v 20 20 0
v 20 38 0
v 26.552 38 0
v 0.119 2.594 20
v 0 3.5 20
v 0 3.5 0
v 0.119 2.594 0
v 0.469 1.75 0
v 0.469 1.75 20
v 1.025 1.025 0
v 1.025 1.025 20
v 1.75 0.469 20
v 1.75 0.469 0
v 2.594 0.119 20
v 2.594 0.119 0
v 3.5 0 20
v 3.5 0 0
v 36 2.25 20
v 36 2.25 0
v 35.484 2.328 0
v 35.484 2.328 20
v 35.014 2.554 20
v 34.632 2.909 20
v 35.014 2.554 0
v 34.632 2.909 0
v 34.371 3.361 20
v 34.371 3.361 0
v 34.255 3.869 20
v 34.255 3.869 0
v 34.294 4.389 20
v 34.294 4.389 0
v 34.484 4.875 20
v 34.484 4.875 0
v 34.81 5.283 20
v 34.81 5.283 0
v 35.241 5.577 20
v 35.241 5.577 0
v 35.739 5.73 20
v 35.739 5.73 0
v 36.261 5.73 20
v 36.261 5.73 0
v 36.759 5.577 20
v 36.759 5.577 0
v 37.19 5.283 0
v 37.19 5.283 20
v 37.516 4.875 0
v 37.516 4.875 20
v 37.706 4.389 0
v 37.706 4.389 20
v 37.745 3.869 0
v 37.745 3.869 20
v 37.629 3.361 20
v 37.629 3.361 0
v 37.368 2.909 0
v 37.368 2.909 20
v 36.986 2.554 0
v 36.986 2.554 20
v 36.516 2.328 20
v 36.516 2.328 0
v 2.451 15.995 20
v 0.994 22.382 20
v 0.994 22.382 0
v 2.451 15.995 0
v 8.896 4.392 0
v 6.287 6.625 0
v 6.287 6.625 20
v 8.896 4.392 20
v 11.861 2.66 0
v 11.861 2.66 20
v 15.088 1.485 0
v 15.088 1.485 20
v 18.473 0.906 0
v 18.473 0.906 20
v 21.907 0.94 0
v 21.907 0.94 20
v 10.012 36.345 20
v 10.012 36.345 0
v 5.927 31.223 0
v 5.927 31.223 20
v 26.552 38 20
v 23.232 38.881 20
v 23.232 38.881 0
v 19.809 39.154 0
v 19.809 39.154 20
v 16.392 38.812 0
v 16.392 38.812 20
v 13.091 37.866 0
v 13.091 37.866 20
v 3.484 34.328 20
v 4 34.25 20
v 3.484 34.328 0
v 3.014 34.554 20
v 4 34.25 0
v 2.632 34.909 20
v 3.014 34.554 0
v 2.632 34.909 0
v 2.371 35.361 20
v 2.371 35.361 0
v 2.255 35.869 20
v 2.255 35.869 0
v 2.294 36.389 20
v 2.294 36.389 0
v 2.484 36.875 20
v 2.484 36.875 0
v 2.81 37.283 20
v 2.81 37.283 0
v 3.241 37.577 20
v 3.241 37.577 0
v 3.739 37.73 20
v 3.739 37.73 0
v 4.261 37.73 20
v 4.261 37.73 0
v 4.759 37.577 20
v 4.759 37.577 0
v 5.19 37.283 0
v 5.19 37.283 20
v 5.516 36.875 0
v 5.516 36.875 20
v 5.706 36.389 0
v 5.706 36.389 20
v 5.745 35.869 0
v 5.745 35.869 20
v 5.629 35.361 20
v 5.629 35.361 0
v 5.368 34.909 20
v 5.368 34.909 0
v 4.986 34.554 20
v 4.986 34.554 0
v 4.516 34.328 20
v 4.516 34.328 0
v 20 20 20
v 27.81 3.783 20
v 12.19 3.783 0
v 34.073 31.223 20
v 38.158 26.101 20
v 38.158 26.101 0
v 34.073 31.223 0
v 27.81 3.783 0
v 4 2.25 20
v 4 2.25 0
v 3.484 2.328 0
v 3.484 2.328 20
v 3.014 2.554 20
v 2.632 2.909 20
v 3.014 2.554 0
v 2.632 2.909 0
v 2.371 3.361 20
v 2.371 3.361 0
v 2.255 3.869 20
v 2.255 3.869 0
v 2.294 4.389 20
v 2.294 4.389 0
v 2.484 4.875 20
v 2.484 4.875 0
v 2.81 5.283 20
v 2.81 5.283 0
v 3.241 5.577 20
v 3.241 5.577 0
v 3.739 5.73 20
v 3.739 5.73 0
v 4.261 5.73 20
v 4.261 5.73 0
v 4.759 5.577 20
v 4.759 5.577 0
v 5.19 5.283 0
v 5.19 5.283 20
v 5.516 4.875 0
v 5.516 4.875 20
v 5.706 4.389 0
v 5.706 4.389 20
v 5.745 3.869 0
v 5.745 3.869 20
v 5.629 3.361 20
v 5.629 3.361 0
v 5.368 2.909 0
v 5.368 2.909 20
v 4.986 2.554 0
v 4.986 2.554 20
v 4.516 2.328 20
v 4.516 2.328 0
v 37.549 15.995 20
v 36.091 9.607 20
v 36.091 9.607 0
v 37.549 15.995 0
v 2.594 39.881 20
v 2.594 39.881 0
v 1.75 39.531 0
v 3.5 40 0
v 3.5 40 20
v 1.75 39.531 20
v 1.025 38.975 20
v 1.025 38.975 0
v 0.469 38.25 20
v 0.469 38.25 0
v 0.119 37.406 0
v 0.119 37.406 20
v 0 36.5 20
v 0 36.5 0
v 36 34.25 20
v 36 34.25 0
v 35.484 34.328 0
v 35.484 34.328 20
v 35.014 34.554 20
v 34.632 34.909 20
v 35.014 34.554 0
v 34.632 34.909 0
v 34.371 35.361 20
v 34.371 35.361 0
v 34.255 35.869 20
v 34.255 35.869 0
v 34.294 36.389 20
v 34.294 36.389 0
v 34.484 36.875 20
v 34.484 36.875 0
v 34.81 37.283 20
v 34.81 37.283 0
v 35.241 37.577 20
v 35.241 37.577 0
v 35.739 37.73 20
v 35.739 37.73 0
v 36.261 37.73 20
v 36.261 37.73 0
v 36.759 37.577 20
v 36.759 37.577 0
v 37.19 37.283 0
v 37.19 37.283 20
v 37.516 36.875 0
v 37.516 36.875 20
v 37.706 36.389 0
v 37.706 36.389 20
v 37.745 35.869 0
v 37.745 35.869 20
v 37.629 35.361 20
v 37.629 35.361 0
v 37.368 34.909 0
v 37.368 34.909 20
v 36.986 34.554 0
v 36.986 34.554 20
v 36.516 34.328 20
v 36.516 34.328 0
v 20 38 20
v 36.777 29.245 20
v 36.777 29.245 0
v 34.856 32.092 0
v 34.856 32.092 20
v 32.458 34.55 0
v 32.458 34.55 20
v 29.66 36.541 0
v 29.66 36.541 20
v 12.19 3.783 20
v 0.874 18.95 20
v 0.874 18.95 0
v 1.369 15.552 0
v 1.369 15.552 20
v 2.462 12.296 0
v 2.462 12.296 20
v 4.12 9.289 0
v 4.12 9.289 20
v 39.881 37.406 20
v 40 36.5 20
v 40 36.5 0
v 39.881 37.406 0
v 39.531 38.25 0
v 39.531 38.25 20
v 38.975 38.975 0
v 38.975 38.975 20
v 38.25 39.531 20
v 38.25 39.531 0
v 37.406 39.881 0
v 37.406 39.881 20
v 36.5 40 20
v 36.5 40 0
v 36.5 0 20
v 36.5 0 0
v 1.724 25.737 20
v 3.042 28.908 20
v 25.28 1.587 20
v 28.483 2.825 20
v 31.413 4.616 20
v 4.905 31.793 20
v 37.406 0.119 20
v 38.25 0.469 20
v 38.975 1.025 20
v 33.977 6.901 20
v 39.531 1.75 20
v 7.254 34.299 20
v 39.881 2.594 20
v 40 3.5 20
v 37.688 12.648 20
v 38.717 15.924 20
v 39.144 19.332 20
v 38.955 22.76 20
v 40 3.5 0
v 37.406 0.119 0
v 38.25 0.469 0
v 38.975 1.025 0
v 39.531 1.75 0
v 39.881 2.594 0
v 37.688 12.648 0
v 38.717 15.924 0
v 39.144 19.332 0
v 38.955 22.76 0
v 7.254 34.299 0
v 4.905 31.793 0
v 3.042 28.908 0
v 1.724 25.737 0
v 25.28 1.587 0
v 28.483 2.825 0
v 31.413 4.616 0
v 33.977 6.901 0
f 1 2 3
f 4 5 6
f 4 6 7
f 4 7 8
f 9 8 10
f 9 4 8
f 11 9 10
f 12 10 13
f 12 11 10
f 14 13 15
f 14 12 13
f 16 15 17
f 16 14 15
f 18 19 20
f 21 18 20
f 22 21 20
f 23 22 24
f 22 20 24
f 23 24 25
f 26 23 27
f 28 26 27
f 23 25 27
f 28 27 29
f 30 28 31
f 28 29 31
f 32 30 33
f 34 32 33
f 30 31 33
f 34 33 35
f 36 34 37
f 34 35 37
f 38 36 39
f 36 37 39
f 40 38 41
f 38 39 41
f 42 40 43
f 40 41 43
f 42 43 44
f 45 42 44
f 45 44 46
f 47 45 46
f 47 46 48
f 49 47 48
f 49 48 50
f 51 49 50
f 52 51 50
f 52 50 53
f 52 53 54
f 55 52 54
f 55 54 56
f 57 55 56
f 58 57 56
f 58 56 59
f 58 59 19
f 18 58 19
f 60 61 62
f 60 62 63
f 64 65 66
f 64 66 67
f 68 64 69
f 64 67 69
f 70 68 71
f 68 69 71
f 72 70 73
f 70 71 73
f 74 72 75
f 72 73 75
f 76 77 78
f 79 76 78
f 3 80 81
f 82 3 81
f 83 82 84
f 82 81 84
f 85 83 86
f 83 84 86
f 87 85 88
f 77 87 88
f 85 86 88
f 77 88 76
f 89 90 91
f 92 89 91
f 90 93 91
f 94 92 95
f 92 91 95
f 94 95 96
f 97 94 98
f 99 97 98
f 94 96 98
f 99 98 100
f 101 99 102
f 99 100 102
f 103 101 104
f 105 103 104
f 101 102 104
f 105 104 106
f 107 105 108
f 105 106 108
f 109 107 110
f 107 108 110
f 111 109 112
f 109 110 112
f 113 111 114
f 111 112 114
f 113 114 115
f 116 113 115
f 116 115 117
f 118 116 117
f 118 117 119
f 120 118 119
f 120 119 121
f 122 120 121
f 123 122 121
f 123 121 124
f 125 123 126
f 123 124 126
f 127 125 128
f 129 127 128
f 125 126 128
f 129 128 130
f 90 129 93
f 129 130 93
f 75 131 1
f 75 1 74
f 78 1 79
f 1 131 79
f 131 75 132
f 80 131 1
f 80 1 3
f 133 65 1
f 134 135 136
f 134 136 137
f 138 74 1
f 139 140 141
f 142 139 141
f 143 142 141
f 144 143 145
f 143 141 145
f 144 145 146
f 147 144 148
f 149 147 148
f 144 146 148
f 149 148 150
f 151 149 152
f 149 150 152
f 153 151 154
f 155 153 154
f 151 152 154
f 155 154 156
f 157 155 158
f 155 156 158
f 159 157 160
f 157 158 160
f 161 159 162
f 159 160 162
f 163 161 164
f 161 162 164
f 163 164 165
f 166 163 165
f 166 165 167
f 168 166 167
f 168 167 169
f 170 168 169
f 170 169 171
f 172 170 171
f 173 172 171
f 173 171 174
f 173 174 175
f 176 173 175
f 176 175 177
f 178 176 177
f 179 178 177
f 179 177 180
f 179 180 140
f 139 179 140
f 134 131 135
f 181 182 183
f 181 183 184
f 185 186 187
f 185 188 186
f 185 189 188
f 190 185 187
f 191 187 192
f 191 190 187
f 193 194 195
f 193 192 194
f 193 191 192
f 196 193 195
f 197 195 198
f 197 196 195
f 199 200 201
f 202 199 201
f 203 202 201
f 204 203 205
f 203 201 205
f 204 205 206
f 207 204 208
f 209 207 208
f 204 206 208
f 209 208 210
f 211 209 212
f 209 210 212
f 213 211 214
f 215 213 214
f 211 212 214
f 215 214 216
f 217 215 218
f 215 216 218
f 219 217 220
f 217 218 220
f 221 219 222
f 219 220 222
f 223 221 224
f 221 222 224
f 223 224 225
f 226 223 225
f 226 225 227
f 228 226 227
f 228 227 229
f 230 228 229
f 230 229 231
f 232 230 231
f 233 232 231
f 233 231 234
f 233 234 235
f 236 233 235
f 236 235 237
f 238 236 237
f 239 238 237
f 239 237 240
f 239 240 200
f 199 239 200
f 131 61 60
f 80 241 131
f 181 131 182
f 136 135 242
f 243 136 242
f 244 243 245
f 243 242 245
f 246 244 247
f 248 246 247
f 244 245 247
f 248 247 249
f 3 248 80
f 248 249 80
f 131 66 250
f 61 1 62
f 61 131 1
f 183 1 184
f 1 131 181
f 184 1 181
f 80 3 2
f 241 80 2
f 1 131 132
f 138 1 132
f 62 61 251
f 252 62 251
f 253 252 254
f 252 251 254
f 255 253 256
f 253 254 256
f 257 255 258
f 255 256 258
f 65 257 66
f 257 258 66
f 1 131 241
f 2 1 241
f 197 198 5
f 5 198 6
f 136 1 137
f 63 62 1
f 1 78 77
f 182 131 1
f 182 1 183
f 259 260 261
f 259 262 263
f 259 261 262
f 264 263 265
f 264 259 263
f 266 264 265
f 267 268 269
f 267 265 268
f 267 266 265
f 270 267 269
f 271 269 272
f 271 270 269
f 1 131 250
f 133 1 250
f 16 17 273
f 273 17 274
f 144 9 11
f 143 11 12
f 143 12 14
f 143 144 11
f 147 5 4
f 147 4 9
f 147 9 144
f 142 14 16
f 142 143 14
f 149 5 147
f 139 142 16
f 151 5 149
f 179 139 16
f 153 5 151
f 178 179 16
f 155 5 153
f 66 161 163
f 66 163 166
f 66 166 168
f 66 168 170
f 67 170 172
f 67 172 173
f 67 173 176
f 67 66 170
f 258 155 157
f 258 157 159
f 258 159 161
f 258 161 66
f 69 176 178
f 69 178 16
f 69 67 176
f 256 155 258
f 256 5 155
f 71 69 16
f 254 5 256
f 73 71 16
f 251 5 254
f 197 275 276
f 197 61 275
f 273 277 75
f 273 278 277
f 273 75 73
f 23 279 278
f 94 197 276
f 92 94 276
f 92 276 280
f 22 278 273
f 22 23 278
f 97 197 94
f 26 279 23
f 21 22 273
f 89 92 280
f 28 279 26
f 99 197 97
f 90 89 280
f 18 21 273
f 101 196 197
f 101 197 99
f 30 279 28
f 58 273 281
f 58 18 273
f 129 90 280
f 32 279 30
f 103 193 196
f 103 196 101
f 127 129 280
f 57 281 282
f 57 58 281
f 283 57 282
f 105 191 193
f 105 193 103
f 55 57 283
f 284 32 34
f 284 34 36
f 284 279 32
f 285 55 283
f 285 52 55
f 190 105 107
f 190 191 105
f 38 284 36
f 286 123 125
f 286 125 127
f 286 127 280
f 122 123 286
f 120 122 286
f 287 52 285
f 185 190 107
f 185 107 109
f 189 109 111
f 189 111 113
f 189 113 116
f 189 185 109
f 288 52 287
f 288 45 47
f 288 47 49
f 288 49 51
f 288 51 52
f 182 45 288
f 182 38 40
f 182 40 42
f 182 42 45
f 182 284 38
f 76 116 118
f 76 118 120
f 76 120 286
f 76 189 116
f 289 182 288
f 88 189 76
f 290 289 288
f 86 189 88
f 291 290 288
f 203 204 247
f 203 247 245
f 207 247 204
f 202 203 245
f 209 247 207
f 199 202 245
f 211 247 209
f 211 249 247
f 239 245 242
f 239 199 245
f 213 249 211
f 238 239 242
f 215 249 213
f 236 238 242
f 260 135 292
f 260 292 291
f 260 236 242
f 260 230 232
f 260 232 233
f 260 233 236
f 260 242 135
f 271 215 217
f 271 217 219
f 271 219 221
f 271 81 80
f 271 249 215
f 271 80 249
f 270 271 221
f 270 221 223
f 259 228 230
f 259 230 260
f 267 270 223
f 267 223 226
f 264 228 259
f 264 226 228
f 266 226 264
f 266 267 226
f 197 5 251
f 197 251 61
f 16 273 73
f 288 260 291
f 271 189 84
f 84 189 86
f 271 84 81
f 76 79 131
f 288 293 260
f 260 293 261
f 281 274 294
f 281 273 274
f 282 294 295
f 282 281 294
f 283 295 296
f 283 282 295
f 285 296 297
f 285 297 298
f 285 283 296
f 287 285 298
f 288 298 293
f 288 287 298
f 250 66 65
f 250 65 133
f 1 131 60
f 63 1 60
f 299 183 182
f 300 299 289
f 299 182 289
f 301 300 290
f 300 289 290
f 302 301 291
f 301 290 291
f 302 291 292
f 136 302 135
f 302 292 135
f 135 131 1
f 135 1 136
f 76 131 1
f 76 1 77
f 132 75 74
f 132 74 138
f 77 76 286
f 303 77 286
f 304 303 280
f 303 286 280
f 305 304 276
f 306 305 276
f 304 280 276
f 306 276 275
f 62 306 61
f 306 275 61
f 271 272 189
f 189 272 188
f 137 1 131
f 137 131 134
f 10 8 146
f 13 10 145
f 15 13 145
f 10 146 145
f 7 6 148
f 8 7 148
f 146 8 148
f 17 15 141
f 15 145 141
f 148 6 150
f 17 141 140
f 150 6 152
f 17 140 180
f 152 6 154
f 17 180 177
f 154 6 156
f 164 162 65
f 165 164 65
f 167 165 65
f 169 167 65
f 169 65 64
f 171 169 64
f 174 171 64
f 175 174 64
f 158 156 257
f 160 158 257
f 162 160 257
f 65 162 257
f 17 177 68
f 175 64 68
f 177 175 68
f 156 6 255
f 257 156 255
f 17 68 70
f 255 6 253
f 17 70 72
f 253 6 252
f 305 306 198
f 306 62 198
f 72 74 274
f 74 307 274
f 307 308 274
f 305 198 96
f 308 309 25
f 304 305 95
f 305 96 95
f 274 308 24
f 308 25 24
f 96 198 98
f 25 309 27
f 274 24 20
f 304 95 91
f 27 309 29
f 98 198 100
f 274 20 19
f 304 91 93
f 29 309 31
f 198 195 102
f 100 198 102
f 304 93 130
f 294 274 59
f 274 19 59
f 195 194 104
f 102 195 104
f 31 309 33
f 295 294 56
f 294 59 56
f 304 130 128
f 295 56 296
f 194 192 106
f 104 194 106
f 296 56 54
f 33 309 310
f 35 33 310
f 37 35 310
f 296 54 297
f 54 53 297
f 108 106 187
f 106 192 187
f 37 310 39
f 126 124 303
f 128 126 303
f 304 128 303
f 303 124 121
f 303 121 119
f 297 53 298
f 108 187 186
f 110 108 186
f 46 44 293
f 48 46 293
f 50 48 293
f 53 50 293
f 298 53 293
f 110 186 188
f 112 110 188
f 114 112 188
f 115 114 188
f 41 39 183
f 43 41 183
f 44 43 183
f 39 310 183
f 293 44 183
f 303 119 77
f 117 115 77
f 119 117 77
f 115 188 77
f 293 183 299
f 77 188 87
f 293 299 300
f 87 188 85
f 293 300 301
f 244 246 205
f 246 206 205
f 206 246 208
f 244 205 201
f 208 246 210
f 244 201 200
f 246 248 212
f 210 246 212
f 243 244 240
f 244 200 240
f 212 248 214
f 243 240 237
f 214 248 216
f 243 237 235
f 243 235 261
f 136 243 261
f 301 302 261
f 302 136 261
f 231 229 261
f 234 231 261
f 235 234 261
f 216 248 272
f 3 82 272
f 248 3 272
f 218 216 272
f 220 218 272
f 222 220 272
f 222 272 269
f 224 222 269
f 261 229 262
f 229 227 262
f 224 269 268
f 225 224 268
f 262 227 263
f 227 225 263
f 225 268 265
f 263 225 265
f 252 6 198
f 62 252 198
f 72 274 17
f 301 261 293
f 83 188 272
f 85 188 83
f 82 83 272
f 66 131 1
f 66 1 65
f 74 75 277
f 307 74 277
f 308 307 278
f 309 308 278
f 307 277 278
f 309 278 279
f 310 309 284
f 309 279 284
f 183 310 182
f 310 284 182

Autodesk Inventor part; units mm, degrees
ref_plane "YZ Plane" through (0, 0, 0) normal (1, 0, 0) x (0, 1, 0)
ref_plane "XZ Plane" through (0, 0, 0) normal (0, 1, 0) x (-1, 0, 0)
ref_plane "XY Plane" through (0, 0, 0) normal (0, 0, 1) x (1, 0, 0)
sketch "Sketch1" plane through (0, 0, 0) normal (0, 0, 1) x (1, 0, 0)
  line L0 (0, 0) -> (40, 0)
  line L1 (40, 0) -> (40, 40)
  line L2 (40, 40) -> (0, 40)
  line L3 (0, 40) -> (0, 0)
  dimension "d0" = 40
  dimension "d1" = 40
extrude "Extrusion1" add sketch "Sketch1" along normal blind 20
hole "Hole1" at (4, 36, 20) direction (0, 0, -1) diameter 3.5 end through all
hole "Hole2" at (4, 4, 20) direction (0, 0, -1) diameter 3.5 end through all
hole "Hole3" at (36, 4, 20) direction (0, 0, -1) diameter 3.5 end through all
hole "Hole4" at (36, 36, 20) direction (0, 0, -1) diameter 3.5 end through all
fillet "Fillet1" radius 3.5 4 edges at (40, 0, 10) (0, 0, 10) (0, 40, 10) (40, 40, 10)
sketch "Sketch2" plane through (0, 0, 20) normal (0, 0, 1) x (1, 0, 0)
  line L0 (36.5, 40) -> (3.5, 40) projected
  line L1 (0, 36.5) -> (0, 3.5) projected
  line L2 (3.5, 0) -> (36.5, 0) projected
  line L3 (40, 3.5) -> (40, 36.5) projected
  line L4 (20, 40) -> (20, 0) construction
  line L5 (0, 20) -> (40, 20) construction
  line L6 (20, 20) -> (20, 38)
  line L7 (20, 20) -> (26.5515, 38)
  line L8 (26.5515, 38) -> (20, 38)
  line L9 (20, 20) -> (5.927, 31.2228)
  line L10 (20, 20) -> (10.0118, 36.345)
  line L11 (10.0118, 36.345) -> (5.927, 31.2228)
  line L12 (20, 20) -> (2.4513, 15.9946)
  line L13 (20, 20) -> (0.9935, 22.3818)
  line L14 (0.9935, 22.3818) -> (2.4513, 15.9946)
  line L15 (20, 20) -> (12.1901, 3.7826)
  line L16 (20, 20) -> (6.2874, 6.6251)
  line L17 (6.2874, 6.6251) -> (12.1901, 3.7826)
  line L18 (20, 20) -> (27.8099, 3.7826)
  line L19 (20, 20) -> (21.9072, 0.94)
  line L20 (21.9072, 0.94) -> (27.8099, 3.7826)
  line L21 (20, 20) -> (37.5487, 15.9946)
  line L22 (20, 20) -> (36.0909, 9.6074)
  line L23 (36.0909, 9.6074) -> (37.5487, 15.9946)
  line L24 (20, 20) -> (34.073, 31.2228)
  line L25 (20, 20) -> (38.1577, 26.1007)
  line L26 (38.1577, 26.1007) -> (34.073, 31.2228)
  circle A0 centre (20, 20) radius 19.1552
  point P0 (0, 0)
  dimension "d41" = 18
  dimension "d42" = 20
  dimension "d45" = 360
extrude "Extrusion2" cut sketch "Sketch2" against normal blind 20 contours L10 A0 L8 L6 | L13 A0 L11 L9 | L16 A0 L14 L12 | L19 A0 L17 L15 | L22 A0 L20 L18 | L25 A0 L23 L21 | L7 A0 L26 L24
properties part number "Fan40x20mm" material "ABS Plastic"
